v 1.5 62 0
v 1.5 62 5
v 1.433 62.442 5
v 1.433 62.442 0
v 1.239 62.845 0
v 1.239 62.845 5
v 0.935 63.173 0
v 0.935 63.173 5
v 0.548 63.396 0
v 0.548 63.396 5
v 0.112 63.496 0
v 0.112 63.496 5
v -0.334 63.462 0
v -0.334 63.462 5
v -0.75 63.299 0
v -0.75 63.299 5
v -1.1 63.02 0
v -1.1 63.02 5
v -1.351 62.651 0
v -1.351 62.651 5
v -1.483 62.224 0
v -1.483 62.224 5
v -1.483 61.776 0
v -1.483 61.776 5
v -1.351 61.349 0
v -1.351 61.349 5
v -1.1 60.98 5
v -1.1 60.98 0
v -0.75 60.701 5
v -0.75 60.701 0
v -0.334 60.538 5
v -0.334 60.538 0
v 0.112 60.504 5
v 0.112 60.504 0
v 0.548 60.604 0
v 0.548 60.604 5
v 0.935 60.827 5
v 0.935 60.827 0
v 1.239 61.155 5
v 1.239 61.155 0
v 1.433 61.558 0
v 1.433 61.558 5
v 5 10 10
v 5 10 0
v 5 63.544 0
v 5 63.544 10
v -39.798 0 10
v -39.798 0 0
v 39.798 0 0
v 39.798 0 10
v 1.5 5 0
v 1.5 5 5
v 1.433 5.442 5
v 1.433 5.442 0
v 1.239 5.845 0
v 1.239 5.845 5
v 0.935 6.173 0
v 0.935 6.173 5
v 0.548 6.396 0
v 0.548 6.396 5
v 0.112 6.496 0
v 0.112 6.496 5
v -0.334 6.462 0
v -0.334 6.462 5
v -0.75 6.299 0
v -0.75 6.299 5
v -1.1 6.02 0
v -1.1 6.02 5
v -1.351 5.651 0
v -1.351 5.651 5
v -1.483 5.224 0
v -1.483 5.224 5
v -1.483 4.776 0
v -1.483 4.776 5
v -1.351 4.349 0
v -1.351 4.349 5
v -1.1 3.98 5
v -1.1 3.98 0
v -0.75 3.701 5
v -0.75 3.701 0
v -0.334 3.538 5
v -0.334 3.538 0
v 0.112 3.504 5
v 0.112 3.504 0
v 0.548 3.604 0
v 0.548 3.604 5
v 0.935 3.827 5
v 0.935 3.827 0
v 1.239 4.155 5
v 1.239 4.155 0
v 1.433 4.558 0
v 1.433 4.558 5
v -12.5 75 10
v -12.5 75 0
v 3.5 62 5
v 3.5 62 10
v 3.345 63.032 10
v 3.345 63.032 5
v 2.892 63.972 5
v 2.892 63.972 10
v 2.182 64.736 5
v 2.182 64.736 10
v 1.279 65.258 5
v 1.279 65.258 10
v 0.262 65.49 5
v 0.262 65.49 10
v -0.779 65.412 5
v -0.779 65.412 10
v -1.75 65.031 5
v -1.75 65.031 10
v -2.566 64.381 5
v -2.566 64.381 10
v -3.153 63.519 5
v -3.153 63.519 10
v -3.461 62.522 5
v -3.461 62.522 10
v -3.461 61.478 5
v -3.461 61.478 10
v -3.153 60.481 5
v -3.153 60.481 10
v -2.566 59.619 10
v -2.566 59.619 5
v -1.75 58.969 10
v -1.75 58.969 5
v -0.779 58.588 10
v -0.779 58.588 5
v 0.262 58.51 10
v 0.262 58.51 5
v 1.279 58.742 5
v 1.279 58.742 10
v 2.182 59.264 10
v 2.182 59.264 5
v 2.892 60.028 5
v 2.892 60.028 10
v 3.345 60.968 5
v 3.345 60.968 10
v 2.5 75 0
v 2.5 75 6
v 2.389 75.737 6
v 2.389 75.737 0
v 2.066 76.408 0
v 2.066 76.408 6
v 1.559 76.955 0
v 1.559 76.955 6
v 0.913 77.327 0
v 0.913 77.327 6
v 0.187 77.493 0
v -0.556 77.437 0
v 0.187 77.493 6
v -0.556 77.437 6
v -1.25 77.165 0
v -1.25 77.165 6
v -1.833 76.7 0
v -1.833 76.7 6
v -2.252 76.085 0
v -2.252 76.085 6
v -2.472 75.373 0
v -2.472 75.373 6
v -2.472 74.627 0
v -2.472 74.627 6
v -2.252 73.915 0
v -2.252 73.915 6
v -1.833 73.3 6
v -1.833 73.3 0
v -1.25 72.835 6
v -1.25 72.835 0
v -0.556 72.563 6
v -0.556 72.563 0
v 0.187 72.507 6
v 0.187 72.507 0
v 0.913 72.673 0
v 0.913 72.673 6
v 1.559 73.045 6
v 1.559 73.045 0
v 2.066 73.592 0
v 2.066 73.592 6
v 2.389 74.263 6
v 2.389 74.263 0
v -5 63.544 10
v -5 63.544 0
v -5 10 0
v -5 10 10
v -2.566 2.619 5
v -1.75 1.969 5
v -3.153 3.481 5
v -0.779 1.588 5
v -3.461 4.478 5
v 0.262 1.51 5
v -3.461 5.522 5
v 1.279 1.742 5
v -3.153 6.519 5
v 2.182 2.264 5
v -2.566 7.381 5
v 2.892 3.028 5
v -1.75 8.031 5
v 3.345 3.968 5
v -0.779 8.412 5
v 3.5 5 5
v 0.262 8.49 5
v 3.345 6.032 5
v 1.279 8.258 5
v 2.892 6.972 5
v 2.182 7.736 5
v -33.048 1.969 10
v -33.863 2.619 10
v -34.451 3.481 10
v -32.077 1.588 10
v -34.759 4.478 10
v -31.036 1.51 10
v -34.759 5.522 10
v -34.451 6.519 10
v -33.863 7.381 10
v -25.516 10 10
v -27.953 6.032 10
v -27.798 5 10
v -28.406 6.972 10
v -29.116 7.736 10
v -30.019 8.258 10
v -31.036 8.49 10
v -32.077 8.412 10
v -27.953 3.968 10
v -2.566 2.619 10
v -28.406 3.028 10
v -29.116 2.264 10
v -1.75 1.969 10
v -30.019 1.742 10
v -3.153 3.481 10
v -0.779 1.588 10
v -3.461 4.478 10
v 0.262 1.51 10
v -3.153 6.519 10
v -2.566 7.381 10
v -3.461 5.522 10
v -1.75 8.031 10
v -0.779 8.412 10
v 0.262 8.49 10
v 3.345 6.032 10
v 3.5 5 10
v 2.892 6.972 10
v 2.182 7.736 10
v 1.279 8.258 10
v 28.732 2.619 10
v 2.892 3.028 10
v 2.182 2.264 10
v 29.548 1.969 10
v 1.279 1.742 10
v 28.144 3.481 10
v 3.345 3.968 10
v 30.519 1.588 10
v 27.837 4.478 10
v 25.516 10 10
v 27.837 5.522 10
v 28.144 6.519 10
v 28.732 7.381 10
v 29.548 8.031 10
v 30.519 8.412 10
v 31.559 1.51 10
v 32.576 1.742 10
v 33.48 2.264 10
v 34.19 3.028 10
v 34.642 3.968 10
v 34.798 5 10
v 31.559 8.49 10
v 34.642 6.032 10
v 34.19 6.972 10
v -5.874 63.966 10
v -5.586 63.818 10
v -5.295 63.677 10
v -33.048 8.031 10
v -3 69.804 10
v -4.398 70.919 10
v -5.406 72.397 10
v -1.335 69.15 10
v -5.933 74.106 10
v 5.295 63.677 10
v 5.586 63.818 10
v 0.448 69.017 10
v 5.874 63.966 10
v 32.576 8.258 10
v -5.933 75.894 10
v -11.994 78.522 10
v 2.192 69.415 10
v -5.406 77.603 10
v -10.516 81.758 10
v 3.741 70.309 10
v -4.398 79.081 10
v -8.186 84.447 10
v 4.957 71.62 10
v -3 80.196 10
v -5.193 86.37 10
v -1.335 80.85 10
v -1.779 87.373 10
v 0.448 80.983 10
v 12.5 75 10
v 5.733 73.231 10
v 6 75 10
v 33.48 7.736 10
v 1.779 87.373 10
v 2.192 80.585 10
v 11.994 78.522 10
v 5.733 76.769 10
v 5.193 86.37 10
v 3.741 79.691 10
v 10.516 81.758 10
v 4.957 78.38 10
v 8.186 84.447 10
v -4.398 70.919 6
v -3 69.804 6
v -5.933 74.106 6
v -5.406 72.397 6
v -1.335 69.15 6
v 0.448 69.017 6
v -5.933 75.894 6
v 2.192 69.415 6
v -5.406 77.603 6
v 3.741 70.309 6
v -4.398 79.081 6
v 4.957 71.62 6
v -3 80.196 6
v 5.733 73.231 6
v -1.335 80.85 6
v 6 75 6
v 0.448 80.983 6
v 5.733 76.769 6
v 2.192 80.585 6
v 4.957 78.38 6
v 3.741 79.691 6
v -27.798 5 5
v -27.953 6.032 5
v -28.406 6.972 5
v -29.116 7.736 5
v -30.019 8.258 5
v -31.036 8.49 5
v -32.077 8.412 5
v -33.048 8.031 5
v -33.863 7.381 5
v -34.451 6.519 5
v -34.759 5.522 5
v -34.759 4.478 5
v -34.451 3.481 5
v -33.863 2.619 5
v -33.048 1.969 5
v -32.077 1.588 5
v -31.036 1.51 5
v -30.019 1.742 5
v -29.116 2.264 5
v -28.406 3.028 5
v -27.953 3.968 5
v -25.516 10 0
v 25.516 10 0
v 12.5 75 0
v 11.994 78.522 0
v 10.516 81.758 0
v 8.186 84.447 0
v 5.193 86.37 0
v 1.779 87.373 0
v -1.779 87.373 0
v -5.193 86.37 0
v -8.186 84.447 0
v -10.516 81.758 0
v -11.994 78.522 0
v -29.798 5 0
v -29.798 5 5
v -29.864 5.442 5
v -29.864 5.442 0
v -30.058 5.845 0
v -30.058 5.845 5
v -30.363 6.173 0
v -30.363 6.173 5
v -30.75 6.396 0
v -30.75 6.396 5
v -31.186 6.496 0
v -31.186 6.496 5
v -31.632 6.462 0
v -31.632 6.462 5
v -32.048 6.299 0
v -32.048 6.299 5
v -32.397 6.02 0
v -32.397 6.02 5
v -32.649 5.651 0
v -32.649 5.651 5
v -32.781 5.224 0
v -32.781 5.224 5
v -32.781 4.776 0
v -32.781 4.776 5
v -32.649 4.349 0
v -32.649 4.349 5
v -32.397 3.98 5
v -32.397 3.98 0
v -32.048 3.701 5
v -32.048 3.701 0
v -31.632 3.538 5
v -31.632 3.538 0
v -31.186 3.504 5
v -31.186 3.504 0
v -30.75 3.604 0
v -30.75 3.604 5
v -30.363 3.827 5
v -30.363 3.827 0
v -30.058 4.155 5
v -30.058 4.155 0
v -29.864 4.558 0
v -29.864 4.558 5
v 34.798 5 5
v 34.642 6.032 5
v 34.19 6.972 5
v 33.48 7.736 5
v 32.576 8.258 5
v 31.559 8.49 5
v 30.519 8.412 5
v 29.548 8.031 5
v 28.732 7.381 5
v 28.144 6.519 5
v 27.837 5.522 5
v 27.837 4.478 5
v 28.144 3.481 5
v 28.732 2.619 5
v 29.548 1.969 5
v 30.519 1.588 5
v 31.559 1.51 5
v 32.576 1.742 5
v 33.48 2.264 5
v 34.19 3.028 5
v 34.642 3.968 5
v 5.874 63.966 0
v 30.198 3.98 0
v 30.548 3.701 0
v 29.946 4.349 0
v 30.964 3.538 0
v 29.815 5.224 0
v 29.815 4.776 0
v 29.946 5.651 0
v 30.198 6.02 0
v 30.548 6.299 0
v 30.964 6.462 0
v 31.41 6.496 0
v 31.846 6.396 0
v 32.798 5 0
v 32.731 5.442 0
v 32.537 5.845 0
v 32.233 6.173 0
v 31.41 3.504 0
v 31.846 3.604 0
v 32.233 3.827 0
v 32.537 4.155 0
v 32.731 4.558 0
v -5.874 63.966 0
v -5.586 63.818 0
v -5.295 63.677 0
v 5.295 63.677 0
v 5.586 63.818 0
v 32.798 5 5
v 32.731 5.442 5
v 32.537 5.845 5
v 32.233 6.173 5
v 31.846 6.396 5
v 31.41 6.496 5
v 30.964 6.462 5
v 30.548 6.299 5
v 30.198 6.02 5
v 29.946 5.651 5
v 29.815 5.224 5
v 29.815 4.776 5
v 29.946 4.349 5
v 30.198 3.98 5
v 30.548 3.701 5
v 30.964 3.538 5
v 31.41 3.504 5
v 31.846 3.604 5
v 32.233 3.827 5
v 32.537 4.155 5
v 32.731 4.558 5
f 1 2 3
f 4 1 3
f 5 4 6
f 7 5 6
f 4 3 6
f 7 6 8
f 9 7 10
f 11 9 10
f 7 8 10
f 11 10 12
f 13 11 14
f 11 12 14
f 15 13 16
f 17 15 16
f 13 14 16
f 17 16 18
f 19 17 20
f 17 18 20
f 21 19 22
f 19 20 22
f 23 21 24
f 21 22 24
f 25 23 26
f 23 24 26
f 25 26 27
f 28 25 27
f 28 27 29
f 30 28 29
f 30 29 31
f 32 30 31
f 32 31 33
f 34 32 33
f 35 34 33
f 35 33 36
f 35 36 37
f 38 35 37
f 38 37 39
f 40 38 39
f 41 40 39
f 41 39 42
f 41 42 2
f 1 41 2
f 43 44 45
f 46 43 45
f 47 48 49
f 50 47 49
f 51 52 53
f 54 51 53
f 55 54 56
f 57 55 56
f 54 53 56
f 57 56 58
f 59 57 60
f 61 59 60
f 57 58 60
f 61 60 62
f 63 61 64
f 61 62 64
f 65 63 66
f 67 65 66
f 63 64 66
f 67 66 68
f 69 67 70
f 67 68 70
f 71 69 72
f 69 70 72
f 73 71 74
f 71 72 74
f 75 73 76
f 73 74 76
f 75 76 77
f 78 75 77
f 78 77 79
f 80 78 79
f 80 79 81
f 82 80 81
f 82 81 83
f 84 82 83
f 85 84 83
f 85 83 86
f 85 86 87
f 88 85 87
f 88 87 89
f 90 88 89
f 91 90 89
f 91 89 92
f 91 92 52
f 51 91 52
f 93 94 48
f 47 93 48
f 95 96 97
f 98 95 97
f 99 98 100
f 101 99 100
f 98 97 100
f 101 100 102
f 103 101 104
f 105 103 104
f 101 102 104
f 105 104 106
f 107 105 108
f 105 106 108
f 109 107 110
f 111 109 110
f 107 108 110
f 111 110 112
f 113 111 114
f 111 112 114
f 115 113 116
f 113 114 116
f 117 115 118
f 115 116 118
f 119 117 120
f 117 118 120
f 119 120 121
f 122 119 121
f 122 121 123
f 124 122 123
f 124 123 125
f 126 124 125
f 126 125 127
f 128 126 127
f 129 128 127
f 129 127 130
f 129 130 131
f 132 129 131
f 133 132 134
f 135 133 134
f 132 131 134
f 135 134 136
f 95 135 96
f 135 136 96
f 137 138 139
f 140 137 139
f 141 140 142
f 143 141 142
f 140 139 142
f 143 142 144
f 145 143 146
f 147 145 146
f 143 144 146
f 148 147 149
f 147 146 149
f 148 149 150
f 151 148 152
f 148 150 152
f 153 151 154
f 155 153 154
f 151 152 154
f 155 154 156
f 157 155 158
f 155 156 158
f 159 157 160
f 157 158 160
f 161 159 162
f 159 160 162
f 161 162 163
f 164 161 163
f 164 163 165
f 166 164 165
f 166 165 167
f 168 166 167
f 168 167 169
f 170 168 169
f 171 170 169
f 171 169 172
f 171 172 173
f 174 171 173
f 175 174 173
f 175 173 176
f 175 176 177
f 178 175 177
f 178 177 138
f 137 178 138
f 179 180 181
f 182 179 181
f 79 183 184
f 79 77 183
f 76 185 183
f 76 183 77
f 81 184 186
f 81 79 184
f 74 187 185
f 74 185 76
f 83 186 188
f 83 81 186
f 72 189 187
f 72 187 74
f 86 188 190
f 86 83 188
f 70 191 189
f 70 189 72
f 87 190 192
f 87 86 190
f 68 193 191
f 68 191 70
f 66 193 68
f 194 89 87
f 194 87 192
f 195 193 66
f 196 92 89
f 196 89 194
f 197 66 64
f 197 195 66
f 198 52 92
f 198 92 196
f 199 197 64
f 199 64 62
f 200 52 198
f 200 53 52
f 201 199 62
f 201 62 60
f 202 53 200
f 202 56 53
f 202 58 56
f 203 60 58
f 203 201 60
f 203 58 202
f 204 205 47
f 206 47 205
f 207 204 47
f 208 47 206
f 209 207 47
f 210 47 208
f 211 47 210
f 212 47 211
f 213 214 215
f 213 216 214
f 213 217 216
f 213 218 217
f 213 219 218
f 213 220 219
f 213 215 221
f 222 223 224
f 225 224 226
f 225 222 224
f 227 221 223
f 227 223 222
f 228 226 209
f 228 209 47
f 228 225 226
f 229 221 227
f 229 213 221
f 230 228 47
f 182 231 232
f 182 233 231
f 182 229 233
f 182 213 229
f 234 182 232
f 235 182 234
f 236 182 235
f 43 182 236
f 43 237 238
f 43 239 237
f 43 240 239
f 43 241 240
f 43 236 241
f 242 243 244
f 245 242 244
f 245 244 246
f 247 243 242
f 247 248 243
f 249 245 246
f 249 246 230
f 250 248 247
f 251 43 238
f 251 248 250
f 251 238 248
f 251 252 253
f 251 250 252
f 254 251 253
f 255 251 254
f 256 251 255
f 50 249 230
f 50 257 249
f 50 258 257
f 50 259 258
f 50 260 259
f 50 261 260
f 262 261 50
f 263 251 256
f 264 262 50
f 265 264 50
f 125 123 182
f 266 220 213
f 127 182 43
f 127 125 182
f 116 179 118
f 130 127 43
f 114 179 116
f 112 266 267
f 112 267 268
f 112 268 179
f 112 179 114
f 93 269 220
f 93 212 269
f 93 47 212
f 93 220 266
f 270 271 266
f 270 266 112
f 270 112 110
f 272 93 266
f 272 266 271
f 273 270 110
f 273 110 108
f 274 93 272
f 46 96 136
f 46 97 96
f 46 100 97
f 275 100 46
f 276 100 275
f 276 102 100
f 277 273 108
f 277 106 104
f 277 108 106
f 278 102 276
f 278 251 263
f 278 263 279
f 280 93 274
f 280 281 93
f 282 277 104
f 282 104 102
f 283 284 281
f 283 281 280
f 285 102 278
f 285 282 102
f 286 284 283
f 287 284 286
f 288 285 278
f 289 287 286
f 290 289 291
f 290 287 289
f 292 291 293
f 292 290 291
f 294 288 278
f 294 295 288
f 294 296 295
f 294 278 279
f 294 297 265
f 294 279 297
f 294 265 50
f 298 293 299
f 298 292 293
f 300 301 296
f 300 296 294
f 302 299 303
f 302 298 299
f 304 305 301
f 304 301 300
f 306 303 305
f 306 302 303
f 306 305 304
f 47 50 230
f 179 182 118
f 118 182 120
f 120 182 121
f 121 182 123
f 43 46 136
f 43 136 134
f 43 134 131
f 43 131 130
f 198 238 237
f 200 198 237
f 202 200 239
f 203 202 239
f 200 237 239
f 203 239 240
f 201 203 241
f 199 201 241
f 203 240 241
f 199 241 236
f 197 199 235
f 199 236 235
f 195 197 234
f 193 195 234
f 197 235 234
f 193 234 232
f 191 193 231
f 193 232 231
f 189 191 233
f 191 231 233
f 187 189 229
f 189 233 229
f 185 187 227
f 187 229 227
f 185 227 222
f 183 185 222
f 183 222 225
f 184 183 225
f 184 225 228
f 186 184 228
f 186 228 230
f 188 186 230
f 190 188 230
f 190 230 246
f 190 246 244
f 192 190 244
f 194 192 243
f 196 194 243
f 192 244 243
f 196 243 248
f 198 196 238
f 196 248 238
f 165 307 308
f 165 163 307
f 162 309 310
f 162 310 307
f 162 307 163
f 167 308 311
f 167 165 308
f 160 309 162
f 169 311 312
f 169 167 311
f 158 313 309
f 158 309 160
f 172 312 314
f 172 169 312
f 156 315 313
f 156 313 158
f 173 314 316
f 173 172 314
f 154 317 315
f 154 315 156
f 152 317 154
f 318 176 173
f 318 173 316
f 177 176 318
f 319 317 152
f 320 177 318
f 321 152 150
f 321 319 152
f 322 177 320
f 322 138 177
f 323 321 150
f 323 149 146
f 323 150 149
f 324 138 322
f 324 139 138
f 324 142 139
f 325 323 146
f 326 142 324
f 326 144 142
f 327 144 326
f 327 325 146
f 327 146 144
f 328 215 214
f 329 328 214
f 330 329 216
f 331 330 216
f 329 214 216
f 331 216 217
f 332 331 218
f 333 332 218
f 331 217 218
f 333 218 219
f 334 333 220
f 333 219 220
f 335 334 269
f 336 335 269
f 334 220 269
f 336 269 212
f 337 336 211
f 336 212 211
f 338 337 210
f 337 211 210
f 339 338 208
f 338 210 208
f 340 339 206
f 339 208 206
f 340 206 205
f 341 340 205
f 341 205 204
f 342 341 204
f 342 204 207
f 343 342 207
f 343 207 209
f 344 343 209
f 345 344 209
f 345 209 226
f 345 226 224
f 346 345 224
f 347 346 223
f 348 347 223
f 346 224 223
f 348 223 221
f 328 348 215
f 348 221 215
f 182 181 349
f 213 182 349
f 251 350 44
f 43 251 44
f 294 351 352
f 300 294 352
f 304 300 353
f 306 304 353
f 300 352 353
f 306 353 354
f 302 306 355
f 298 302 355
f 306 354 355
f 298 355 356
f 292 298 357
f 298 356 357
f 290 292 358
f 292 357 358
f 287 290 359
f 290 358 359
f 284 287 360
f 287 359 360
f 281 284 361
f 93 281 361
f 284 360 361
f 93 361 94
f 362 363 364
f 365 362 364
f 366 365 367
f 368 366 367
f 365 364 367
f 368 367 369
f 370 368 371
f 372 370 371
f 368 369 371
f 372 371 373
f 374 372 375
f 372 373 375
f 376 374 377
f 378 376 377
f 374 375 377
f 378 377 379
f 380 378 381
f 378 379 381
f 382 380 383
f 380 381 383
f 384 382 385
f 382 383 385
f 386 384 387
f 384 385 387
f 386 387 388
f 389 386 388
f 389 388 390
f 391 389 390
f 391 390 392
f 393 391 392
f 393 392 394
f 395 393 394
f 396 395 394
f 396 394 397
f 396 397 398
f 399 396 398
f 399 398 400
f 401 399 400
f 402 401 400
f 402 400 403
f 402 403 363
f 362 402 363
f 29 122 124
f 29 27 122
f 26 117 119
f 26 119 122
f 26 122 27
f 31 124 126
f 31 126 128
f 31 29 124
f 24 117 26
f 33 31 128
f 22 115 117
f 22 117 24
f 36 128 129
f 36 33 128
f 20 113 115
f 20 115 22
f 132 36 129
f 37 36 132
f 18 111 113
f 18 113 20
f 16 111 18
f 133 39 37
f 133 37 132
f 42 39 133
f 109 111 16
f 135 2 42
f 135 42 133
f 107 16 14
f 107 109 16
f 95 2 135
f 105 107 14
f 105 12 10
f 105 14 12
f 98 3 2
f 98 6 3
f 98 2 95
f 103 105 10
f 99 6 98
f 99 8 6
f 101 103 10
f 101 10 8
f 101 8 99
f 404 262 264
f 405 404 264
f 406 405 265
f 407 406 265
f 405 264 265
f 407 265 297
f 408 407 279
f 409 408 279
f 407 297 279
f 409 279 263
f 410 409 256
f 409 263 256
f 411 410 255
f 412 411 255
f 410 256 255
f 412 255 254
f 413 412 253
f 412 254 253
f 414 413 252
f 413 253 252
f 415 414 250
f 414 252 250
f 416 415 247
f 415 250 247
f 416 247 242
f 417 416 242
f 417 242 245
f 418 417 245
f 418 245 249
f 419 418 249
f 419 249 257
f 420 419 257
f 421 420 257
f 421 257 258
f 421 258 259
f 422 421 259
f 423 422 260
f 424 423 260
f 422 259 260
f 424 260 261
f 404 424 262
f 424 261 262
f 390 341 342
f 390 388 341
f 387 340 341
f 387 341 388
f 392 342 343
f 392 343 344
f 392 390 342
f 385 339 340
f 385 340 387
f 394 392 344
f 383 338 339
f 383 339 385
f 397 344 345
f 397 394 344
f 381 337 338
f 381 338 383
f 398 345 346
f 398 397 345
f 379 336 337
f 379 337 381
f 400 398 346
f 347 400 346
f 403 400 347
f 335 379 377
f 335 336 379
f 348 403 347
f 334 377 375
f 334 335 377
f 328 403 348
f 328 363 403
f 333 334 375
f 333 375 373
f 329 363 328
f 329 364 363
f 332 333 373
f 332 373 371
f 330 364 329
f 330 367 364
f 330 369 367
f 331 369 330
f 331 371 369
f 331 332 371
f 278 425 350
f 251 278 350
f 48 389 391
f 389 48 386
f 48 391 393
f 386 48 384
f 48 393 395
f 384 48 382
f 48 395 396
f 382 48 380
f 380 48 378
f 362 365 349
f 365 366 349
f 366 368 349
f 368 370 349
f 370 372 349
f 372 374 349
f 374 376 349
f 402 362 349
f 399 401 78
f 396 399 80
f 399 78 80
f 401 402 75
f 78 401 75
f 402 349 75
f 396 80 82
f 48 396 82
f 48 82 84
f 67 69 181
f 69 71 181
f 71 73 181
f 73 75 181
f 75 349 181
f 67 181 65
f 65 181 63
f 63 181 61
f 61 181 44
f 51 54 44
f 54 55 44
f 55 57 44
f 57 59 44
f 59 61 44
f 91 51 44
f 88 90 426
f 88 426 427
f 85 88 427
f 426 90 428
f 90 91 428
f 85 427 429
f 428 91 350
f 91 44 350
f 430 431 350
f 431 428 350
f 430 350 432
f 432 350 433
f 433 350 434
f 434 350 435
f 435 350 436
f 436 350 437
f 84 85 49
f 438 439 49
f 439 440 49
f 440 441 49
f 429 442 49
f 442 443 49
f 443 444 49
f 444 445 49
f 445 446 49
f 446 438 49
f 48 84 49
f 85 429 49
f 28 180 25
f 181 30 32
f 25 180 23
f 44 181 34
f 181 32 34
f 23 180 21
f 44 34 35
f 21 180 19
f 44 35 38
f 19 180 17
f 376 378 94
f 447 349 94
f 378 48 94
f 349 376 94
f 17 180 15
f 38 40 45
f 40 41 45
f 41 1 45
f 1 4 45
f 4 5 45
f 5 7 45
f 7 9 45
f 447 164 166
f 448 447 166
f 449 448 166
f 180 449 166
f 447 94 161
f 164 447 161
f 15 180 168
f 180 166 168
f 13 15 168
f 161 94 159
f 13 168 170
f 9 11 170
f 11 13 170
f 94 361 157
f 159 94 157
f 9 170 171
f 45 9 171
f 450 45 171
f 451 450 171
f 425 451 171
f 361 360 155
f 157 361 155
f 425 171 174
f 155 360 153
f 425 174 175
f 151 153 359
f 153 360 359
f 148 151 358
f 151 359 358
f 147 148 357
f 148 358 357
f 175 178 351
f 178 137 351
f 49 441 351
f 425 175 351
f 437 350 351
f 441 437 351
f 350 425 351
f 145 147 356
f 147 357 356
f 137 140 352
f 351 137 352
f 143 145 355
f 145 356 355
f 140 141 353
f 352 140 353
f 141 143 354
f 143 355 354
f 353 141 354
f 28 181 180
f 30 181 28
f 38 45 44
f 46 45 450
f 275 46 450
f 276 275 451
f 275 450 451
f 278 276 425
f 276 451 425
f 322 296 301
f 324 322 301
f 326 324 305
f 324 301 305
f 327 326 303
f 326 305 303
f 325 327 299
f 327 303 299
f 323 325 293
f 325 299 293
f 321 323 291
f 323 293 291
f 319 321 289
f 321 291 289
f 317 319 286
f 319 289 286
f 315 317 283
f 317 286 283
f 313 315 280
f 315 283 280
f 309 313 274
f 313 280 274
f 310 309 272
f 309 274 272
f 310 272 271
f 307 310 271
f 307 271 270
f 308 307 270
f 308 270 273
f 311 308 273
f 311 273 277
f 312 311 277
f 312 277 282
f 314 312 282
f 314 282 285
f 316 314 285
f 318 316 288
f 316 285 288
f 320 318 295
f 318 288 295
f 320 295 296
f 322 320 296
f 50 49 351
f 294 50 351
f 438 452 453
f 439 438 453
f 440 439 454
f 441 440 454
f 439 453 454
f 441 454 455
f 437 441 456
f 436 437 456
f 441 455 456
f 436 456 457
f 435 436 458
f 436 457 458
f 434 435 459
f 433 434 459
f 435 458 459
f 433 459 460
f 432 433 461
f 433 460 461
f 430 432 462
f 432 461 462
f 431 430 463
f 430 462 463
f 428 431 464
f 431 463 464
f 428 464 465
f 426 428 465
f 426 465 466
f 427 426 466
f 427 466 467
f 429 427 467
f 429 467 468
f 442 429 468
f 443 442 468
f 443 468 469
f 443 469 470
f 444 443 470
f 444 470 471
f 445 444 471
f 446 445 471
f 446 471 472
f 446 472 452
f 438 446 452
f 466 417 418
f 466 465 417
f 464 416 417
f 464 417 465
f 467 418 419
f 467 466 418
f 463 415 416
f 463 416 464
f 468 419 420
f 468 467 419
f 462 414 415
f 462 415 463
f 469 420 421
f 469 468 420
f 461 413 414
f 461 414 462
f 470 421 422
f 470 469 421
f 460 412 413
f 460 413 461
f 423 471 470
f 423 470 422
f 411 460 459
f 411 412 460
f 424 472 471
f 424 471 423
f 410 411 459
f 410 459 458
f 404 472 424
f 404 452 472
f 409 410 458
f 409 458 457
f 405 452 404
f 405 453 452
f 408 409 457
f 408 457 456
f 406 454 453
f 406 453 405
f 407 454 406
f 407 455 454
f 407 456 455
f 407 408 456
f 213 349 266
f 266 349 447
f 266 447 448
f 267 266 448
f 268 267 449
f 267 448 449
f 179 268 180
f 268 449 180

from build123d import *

# Parameters (mm, degrees)
SKETCH1_R           = 12.5
BOSS_EXTRUDE1_DEPTH = 10
CUT_EXTRUDE1_REACH  = 98.644
SKETCH2_R           = 2.5
SKETCH2_3_R         = 6
SKETCH2_3_R_2       = 2.5
CUT_EXTRUDE2_DEPTH  = 4
CUT_EXTRUDE4_REACH  = 98.644
SKETCH3_R           = 1.5
SKETCH3_4_R         = 3.5
SKETCH3_4_R_2       = 1.5
CUT_EXTRUDE5_DEPTH  = 5


with BuildPart() as part:
    # Sketch1 → Boss-Extrude1 (new body)
    with BuildSketch(Plane.XY):
        with Locations((0, 75)):
            Circle(SKETCH1_R)
        with BuildLine():
            Line((-39.79776757, 0), (39.79776757, 0))
            Line((39.79776757, 0), (12.5, 75))
            ThreePointArc((12.5, 75), (10.716279715, 68.564834962), (5.87418415, 63.966235431))
            Line((5.87418415, 63.966235431), (25.516287503, 10))
            Line((25.516287503, 10), (-25.516287503, 10))
            Line((-25.516287503, 10), (-5.87418415, 63.966235431))
            ThreePointArc((-5.87418415, 63.966235431), (-10.716279715, 68.564834962), (-12.5, 75))
            Line((-12.5, 75), (-39.79776757, 0))
        make_face()
        with BuildLine():
            Line((-5, 10), (5, 10))
            Line((5, 10), (5, 63.543560763))
            ThreePointArc((5, 63.543560763), (0, 62.5), (-5, 63.543560763))
            Line((-5, 63.543560763), (-5, 10))
        make_face()
    extrude(amount=BOSS_EXTRUDE1_DEPTH)

    # Sketch2 → Cut-Extrude1 (cut, up to next)
    with BuildSketch(Plane.XY.offset(10), mode=Mode.PRIVATE) as cut_extrude1_sk1:
        with Locations((0, 75)):
            Circle(SKETCH2_R)
    cut_extrude1_tool1 = extrude(cut_extrude1_sk1.sketch, amount=-CUT_EXTRUDE1_REACH, mode=Mode.PRIVATE) & part.part
    add(cut_extrude1_tool1.solids().sort_by_distance((0, 75, 10))[0], mode=Mode.SUBTRACT)

    # Sketch2<3> → Cut-Extrude2 (cut)
    with BuildSketch(Plane.XY.offset(10)):
        with Locations((0, 75)):
            Circle(SKETCH2_3_R)
        with Locations((0, 75)):
            Circle(SKETCH2_3_R_2, mode=Mode.SUBTRACT)
    extrude(amount=-CUT_EXTRUDE2_DEPTH, mode=Mode.SUBTRACT)

    # Sketch3 → Cut-Extrude4 (cut, up to next)
    with BuildSketch(Plane.XY.offset(10), mode=Mode.PRIVATE) as cut_extrude4_sk1:
        with Locations((0, 5)):
            Circle(SKETCH3_R)
    cut_extrude4_tool1 = extrude(cut_extrude4_sk1.sketch, amount=-CUT_EXTRUDE4_REACH, mode=Mode.PRIVATE) & part.part
    # Sketch3 → Cut-Extrude4 (cut, up to next)
    with BuildSketch(Plane.XY.offset(10), mode=Mode.PRIVATE) as cut_extrude4_sk2:
        with Locations((31.29776757, 5)):
            Circle(SKETCH3_R)
    cut_extrude4_tool2 = extrude(cut_extrude4_sk2.sketch, amount=-CUT_EXTRUDE4_REACH, mode=Mode.PRIVATE) & part.part
    # Sketch3 → Cut-Extrude4 (cut, up to next)
    with BuildSketch(Plane.XY.offset(10), mode=Mode.PRIVATE) as cut_extrude4_sk3:
        with Locations((-31.29776757, 5)):
            Circle(SKETCH3_R)
    cut_extrude4_tool3 = extrude(cut_extrude4_sk3.sketch, amount=-CUT_EXTRUDE4_REACH, mode=Mode.PRIVATE) & part.part
    # Sketch3 → Cut-Extrude4 (cut, up to next)
    with BuildSketch(Plane.XY.offset(10), mode=Mode.PRIVATE) as cut_extrude4_sk4:
        with Locations((0, 62)):
            Circle(SKETCH3_R)
    cut_extrude4_tool4 = extrude(cut_extrude4_sk4.sketch, amount=-CUT_EXTRUDE4_REACH, mode=Mode.PRIVATE) & part.part
    add(cut_extrude4_tool1.solids().sort_by_distance((0, 5, 10))[0], mode=Mode.SUBTRACT)
    add(cut_extrude4_tool2.solids().sort_by_distance((31.297768, 5, 10))[0], mode=Mode.SUBTRACT)
    add(cut_extrude4_tool3.solids().sort_by_distance((-31.297768, 5, 10))[0], mode=Mode.SUBTRACT)
    add(cut_extrude4_tool4.solids().sort_by_distance((0, 62, 10))[0], mode=Mode.SUBTRACT)

    # Sketch3<4> → Cut-Extrude5 (cut)
    # profile 1 of 4: a face of its own
    with BuildSketch(Plane.XY.offset(10)):
        with Locations((0, 62)):
            Circle(SKETCH3_4_R)
    # profile 2 of 4: a face of its own
    with BuildSketch(Plane.XY.offset(10)):
        with Locations((-31.29776757, 5)):
            Circle(SKETCH3_4_R)
        with Locations((-31.29776757, 5)):
            Circle(SKETCH3_4_R_2, mode=Mode.SUBTRACT)
    # profile 3 of 4: a face of its own
    with BuildSketch(Plane.XY.offset(10)):
        with Locations((0, 5)):
            Circle(SKETCH3_4_R)
        with Locations((0, 5)):
            Circle(SKETCH3_4_R_2, mode=Mode.SUBTRACT)
    # profile 4 of 4: a face of its own
    with BuildSketch(Plane.XY.offset(10)):
        with Locations((31.29776757, 5)):
            Circle(SKETCH3_4_R)
        with Locations((31.29776757, 5)):
            Circle(SKETCH3_4_R_2, mode=Mode.SUBTRACT)
    extrude(amount=-CUT_EXTRUDE5_DEPTH, mode=Mode.SUBTRACT)


solid = part.part
